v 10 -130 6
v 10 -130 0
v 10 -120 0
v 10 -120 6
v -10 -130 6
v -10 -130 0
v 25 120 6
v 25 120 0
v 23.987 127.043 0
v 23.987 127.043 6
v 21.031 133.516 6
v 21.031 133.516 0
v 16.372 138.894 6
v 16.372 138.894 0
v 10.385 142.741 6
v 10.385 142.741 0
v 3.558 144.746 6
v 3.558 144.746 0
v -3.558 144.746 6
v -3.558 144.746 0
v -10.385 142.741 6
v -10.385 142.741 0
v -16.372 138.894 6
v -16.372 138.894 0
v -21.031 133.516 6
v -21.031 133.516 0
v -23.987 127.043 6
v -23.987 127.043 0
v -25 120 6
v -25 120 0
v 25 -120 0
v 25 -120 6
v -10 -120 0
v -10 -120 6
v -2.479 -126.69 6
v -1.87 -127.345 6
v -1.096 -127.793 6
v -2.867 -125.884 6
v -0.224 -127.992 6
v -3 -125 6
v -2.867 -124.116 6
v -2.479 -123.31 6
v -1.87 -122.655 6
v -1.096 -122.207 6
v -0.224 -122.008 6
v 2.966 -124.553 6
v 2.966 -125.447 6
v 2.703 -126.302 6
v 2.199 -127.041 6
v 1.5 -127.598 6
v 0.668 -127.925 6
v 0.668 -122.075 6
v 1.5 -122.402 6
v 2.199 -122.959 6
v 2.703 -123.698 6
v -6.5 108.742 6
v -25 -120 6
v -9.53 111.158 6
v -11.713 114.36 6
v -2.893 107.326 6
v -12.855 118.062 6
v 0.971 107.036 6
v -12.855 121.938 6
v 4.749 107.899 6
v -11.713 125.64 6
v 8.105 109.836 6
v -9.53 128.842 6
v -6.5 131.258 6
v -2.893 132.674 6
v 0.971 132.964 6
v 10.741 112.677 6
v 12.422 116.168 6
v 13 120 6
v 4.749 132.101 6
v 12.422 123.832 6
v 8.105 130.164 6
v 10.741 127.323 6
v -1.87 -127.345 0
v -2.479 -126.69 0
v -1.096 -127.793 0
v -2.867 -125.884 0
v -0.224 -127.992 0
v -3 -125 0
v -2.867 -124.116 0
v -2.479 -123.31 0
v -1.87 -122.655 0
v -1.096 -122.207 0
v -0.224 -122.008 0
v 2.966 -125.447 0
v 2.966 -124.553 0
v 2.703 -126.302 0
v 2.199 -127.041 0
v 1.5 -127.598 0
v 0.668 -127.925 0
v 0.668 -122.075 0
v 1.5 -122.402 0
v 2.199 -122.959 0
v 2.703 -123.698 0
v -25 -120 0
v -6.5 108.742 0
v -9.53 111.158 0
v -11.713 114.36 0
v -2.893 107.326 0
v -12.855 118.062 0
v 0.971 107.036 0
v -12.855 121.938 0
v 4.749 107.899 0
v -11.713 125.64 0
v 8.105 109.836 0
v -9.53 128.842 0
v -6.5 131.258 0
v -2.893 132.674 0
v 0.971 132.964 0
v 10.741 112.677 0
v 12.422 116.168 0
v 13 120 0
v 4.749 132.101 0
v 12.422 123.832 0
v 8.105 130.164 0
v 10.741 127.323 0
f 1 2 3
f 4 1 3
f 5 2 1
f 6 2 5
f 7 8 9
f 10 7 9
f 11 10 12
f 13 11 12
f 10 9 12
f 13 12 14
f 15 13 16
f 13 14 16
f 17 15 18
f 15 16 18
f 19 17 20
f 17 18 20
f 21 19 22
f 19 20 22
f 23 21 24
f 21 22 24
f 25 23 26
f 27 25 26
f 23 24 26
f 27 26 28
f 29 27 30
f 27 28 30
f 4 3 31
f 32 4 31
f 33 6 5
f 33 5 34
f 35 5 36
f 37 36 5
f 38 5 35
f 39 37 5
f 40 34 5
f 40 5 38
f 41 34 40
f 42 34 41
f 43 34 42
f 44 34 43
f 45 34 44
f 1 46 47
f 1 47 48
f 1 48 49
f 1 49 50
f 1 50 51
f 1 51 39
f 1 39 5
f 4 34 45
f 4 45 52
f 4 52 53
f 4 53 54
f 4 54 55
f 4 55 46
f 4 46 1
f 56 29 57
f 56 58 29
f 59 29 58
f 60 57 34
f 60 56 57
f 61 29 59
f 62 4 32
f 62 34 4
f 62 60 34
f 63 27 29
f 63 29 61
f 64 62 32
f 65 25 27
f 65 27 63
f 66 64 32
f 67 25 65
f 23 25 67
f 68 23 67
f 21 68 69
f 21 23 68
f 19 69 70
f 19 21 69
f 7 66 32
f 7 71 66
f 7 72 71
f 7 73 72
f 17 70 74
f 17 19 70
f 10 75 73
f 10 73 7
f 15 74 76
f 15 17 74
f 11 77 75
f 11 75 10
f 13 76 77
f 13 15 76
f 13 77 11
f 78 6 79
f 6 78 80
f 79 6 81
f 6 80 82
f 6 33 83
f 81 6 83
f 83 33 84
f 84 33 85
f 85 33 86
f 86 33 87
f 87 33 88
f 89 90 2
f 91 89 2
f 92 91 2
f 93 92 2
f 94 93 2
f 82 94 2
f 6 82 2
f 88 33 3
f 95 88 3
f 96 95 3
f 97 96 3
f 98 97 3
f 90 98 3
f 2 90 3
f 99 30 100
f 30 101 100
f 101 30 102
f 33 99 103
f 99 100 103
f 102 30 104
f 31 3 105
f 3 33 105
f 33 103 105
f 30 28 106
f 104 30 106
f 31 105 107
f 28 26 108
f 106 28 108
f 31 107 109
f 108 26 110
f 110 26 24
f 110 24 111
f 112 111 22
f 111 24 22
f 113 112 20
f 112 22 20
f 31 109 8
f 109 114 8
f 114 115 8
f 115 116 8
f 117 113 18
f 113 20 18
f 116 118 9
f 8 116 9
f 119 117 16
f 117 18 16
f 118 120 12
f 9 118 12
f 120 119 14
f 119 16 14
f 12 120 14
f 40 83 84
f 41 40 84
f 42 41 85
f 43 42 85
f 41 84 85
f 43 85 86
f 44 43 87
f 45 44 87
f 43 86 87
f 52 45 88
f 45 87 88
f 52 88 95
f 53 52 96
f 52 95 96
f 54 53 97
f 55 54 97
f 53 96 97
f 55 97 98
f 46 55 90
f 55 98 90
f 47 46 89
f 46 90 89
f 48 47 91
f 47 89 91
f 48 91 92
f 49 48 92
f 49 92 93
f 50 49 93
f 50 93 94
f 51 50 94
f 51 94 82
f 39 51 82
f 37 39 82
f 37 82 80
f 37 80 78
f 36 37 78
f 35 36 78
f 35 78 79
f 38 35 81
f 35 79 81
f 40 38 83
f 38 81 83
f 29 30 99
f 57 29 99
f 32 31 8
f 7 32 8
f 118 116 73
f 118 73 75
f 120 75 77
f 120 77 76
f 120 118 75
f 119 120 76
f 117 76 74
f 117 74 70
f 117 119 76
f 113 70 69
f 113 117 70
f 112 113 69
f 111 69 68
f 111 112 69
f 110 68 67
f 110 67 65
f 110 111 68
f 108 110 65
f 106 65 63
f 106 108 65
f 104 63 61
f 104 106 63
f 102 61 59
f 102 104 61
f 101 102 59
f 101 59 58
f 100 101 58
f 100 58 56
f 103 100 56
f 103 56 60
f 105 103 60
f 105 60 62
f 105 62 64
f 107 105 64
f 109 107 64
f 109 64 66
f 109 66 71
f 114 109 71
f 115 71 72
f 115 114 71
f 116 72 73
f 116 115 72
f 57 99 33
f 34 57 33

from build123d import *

# Parameters (mm, degrees)
SKETCH1_R           = 13
BOSS_EXTRUDE1_DEPTH = 6
SKETCH2_W           = 20
SKETCH2_H           = 10
SKETCH2_R           = 3
BOSS_EXTRUDE2_DEPTH = 6


with BuildPart() as part:
    # Sketch1 → Boss-Extrude1 (new body)
    with BuildSketch(Plane.XY):
        with BuildLine():
            Line((-25, -120), (25, -120))
            Line((25, -120), (25, 120))
            ThreePointArc((25, 120), (0, 145), (-25, 120))
            Line((-25, 120), (-25, -120))
        make_face()
        with Locations((0, 120)):
            Circle(SKETCH1_R, mode=Mode.SUBTRACT)
    extrude(amount=BOSS_EXTRUDE1_DEPTH)

    # Sketch2 → Boss-Extrude2 (add)
    with BuildSketch(Plane(origin=(0, 0, 0), x_dir=(-1, 0, 0), z_dir=(0, 0, -1))):
        with Locations((0, -125)):
            Rectangle(SKETCH2_W, SKETCH2_H)
        with Locations((0, -125)):
            Circle(SKETCH2_R, mode=Mode.SUBTRACT)
    extrude(amount=-BOSS_EXTRUDE2_DEPTH)


solid = part.part
